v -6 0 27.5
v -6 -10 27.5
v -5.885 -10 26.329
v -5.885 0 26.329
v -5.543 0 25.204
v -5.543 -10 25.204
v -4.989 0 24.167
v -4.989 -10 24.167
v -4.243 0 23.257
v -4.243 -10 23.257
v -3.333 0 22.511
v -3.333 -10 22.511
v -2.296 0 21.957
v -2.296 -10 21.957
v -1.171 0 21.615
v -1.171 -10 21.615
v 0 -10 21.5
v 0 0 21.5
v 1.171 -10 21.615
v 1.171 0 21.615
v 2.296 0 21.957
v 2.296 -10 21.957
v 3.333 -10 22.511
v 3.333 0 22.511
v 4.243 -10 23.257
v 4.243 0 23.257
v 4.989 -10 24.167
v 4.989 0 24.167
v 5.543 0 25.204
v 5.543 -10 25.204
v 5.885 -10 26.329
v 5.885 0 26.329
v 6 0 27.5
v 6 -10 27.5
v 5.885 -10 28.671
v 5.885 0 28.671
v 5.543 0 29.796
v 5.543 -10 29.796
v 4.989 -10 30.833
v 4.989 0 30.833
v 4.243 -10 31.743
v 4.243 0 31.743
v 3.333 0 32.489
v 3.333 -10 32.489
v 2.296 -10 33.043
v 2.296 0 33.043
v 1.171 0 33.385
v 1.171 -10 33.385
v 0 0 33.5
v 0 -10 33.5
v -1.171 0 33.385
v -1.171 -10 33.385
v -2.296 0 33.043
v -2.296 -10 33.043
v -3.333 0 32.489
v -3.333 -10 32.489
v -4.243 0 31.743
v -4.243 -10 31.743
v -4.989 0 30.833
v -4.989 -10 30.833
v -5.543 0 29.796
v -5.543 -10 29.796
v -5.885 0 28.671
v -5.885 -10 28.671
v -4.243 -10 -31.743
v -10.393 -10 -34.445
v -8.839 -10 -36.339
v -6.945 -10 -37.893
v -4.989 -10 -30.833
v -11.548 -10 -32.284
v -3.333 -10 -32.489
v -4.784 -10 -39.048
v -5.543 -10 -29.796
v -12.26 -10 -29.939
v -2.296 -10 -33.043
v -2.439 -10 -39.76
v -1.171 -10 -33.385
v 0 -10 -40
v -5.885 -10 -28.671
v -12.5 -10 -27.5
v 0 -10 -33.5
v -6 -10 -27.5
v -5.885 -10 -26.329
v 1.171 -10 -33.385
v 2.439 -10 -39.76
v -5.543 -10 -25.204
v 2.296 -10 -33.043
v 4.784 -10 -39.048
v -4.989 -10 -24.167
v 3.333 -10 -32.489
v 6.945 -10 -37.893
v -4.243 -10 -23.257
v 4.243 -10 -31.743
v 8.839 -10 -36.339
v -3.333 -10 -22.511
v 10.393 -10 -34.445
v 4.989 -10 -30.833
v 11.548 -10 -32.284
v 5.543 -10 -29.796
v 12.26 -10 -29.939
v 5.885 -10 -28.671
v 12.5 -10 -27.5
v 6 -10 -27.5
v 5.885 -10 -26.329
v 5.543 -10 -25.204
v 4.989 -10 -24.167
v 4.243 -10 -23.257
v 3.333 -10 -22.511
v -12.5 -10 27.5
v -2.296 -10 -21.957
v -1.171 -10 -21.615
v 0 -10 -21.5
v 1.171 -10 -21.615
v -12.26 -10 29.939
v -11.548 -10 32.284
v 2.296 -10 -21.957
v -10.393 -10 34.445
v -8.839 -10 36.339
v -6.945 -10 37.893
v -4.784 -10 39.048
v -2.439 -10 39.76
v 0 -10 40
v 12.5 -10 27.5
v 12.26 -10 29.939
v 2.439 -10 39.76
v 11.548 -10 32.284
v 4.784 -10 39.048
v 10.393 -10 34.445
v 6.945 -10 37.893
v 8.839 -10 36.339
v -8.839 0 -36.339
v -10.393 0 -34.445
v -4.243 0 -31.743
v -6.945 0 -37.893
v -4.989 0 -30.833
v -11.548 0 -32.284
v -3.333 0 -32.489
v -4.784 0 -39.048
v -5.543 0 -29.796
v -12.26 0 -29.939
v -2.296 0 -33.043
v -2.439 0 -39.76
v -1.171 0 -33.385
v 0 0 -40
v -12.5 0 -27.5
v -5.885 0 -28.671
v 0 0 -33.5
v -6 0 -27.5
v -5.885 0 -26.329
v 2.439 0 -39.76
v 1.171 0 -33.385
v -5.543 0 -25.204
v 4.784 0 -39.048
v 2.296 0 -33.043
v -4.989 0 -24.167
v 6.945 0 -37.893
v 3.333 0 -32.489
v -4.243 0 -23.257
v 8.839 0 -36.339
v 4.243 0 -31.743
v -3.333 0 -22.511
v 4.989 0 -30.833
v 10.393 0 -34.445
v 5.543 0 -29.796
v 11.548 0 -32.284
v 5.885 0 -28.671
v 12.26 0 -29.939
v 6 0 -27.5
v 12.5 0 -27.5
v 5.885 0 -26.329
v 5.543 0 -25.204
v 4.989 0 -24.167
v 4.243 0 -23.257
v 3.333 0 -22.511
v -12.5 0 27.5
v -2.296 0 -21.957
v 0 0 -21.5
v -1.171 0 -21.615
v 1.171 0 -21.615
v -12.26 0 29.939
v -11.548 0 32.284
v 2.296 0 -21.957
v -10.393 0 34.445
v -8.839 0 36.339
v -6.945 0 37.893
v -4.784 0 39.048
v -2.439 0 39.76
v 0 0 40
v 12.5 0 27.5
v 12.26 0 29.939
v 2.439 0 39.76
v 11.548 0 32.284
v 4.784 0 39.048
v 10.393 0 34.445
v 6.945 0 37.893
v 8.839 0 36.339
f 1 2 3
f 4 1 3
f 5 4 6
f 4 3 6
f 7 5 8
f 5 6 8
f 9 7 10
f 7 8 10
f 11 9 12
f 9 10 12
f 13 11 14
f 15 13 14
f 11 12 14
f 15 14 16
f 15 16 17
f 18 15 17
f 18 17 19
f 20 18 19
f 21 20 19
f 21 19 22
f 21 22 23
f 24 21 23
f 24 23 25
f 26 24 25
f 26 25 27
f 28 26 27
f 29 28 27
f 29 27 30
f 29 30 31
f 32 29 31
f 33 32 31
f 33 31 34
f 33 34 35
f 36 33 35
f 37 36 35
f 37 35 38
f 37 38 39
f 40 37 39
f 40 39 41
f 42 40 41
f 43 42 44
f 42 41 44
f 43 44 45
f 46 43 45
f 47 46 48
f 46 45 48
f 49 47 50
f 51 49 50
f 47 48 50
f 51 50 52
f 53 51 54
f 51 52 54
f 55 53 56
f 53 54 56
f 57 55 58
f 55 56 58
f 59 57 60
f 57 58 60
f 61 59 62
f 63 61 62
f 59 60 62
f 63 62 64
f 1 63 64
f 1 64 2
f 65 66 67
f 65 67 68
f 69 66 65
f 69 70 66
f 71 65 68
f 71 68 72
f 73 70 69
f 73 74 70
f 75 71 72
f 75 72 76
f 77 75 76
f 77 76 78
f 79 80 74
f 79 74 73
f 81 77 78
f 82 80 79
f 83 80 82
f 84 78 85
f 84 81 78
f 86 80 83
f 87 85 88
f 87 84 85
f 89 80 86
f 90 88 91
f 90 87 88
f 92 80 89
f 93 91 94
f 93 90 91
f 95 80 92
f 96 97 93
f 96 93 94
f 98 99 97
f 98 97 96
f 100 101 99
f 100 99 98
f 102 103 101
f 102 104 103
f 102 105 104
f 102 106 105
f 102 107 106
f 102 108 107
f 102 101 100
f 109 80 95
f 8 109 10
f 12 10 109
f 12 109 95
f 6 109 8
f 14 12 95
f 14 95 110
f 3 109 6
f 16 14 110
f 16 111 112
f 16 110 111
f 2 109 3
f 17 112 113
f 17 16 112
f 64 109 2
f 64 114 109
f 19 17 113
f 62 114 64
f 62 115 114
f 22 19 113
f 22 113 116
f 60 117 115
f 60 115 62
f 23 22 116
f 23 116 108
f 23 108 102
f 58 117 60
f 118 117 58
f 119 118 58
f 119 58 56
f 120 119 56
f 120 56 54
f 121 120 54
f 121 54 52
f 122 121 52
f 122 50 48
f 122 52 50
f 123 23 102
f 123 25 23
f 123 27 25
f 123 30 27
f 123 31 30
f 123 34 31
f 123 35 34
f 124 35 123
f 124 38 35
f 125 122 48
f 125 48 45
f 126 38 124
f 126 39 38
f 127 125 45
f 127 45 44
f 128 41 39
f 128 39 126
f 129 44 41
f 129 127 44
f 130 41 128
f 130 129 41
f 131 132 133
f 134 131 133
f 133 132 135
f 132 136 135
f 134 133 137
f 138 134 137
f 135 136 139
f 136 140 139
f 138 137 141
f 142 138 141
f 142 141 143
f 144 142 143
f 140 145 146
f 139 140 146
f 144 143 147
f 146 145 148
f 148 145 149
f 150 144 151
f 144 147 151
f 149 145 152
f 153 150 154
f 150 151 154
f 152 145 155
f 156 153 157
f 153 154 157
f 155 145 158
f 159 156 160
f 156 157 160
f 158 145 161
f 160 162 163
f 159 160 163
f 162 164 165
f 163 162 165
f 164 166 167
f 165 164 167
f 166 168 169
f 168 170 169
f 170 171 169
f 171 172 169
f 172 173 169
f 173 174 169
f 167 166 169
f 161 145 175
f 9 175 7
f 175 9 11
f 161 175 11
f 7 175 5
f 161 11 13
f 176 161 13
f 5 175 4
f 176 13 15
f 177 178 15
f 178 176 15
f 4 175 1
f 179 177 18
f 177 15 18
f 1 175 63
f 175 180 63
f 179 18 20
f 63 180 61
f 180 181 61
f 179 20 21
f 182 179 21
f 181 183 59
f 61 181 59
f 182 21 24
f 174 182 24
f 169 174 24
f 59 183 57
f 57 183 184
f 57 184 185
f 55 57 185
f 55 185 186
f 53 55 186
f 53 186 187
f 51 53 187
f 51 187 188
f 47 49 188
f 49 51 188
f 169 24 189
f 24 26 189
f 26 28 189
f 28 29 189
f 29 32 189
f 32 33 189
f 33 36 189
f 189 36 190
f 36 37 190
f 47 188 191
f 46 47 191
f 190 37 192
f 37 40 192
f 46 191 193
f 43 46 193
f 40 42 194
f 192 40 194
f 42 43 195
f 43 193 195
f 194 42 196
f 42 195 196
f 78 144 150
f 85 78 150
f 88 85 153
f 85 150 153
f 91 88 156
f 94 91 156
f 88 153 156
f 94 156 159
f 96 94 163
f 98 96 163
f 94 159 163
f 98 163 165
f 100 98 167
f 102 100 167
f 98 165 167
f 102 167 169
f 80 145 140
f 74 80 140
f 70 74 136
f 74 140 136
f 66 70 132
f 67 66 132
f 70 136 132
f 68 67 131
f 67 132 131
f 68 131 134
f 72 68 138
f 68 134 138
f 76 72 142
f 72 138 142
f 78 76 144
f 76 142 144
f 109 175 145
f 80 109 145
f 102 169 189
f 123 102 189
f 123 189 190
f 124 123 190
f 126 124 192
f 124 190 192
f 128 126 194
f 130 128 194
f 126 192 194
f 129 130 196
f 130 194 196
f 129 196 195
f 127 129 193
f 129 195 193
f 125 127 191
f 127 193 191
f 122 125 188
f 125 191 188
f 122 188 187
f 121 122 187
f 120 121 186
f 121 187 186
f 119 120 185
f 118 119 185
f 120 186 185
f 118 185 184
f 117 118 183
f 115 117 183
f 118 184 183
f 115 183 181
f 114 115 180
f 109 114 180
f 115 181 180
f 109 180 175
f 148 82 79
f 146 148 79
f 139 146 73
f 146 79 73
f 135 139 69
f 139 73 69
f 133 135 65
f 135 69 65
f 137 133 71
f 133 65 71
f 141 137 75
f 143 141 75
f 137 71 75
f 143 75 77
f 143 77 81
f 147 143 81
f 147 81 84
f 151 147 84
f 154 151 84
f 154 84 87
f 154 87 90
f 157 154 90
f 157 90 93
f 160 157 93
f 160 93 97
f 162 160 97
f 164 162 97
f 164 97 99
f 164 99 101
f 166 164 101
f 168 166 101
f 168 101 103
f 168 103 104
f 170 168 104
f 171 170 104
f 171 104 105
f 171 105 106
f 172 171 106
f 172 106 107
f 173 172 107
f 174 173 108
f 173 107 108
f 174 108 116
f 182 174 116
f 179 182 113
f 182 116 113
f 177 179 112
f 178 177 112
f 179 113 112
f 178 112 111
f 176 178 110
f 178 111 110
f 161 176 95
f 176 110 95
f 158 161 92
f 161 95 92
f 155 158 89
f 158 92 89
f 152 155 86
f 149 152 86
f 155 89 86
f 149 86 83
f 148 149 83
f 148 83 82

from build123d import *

# Parameters (mm, degrees)
F1_DEPTH = 10
F2_D     = 12
F2_DEPTH = 30


with BuildPart() as f1:
    # F0 (on Front) → F1 (new body)
    with BuildSketch(Plane.XZ):
        with BuildLine():
            ThreePointArc((0, -40), (8.838835, -36.338835), (12.5, -27.5))
            Line((12.5, -27.5), (12.5, 27.5))
            ThreePointArc((12.5, 27.5), (8.838835, 36.338835), (0, 40))
            ThreePointArc((0, 40), (-8.838835, 36.338835), (-12.5, 27.5))
            Line((-12.5, 27.5), (-12.5, -27.5))
            ThreePointArc((-12.5, -27.5), (-8.838835, -36.338835), (0, -40))
        make_face()
    extrude(amount=F1_DEPTH)

    # F2
    with Locations(Plane(origin=(0, 0, 0), x_dir=(1, 0, 0), z_dir=(0, 1, 0))):
        with Locations((0, 27.5), (0, -27.5)):
            Hole(F2_D / 2, depth=F2_DEPTH)


solid = f1.part
